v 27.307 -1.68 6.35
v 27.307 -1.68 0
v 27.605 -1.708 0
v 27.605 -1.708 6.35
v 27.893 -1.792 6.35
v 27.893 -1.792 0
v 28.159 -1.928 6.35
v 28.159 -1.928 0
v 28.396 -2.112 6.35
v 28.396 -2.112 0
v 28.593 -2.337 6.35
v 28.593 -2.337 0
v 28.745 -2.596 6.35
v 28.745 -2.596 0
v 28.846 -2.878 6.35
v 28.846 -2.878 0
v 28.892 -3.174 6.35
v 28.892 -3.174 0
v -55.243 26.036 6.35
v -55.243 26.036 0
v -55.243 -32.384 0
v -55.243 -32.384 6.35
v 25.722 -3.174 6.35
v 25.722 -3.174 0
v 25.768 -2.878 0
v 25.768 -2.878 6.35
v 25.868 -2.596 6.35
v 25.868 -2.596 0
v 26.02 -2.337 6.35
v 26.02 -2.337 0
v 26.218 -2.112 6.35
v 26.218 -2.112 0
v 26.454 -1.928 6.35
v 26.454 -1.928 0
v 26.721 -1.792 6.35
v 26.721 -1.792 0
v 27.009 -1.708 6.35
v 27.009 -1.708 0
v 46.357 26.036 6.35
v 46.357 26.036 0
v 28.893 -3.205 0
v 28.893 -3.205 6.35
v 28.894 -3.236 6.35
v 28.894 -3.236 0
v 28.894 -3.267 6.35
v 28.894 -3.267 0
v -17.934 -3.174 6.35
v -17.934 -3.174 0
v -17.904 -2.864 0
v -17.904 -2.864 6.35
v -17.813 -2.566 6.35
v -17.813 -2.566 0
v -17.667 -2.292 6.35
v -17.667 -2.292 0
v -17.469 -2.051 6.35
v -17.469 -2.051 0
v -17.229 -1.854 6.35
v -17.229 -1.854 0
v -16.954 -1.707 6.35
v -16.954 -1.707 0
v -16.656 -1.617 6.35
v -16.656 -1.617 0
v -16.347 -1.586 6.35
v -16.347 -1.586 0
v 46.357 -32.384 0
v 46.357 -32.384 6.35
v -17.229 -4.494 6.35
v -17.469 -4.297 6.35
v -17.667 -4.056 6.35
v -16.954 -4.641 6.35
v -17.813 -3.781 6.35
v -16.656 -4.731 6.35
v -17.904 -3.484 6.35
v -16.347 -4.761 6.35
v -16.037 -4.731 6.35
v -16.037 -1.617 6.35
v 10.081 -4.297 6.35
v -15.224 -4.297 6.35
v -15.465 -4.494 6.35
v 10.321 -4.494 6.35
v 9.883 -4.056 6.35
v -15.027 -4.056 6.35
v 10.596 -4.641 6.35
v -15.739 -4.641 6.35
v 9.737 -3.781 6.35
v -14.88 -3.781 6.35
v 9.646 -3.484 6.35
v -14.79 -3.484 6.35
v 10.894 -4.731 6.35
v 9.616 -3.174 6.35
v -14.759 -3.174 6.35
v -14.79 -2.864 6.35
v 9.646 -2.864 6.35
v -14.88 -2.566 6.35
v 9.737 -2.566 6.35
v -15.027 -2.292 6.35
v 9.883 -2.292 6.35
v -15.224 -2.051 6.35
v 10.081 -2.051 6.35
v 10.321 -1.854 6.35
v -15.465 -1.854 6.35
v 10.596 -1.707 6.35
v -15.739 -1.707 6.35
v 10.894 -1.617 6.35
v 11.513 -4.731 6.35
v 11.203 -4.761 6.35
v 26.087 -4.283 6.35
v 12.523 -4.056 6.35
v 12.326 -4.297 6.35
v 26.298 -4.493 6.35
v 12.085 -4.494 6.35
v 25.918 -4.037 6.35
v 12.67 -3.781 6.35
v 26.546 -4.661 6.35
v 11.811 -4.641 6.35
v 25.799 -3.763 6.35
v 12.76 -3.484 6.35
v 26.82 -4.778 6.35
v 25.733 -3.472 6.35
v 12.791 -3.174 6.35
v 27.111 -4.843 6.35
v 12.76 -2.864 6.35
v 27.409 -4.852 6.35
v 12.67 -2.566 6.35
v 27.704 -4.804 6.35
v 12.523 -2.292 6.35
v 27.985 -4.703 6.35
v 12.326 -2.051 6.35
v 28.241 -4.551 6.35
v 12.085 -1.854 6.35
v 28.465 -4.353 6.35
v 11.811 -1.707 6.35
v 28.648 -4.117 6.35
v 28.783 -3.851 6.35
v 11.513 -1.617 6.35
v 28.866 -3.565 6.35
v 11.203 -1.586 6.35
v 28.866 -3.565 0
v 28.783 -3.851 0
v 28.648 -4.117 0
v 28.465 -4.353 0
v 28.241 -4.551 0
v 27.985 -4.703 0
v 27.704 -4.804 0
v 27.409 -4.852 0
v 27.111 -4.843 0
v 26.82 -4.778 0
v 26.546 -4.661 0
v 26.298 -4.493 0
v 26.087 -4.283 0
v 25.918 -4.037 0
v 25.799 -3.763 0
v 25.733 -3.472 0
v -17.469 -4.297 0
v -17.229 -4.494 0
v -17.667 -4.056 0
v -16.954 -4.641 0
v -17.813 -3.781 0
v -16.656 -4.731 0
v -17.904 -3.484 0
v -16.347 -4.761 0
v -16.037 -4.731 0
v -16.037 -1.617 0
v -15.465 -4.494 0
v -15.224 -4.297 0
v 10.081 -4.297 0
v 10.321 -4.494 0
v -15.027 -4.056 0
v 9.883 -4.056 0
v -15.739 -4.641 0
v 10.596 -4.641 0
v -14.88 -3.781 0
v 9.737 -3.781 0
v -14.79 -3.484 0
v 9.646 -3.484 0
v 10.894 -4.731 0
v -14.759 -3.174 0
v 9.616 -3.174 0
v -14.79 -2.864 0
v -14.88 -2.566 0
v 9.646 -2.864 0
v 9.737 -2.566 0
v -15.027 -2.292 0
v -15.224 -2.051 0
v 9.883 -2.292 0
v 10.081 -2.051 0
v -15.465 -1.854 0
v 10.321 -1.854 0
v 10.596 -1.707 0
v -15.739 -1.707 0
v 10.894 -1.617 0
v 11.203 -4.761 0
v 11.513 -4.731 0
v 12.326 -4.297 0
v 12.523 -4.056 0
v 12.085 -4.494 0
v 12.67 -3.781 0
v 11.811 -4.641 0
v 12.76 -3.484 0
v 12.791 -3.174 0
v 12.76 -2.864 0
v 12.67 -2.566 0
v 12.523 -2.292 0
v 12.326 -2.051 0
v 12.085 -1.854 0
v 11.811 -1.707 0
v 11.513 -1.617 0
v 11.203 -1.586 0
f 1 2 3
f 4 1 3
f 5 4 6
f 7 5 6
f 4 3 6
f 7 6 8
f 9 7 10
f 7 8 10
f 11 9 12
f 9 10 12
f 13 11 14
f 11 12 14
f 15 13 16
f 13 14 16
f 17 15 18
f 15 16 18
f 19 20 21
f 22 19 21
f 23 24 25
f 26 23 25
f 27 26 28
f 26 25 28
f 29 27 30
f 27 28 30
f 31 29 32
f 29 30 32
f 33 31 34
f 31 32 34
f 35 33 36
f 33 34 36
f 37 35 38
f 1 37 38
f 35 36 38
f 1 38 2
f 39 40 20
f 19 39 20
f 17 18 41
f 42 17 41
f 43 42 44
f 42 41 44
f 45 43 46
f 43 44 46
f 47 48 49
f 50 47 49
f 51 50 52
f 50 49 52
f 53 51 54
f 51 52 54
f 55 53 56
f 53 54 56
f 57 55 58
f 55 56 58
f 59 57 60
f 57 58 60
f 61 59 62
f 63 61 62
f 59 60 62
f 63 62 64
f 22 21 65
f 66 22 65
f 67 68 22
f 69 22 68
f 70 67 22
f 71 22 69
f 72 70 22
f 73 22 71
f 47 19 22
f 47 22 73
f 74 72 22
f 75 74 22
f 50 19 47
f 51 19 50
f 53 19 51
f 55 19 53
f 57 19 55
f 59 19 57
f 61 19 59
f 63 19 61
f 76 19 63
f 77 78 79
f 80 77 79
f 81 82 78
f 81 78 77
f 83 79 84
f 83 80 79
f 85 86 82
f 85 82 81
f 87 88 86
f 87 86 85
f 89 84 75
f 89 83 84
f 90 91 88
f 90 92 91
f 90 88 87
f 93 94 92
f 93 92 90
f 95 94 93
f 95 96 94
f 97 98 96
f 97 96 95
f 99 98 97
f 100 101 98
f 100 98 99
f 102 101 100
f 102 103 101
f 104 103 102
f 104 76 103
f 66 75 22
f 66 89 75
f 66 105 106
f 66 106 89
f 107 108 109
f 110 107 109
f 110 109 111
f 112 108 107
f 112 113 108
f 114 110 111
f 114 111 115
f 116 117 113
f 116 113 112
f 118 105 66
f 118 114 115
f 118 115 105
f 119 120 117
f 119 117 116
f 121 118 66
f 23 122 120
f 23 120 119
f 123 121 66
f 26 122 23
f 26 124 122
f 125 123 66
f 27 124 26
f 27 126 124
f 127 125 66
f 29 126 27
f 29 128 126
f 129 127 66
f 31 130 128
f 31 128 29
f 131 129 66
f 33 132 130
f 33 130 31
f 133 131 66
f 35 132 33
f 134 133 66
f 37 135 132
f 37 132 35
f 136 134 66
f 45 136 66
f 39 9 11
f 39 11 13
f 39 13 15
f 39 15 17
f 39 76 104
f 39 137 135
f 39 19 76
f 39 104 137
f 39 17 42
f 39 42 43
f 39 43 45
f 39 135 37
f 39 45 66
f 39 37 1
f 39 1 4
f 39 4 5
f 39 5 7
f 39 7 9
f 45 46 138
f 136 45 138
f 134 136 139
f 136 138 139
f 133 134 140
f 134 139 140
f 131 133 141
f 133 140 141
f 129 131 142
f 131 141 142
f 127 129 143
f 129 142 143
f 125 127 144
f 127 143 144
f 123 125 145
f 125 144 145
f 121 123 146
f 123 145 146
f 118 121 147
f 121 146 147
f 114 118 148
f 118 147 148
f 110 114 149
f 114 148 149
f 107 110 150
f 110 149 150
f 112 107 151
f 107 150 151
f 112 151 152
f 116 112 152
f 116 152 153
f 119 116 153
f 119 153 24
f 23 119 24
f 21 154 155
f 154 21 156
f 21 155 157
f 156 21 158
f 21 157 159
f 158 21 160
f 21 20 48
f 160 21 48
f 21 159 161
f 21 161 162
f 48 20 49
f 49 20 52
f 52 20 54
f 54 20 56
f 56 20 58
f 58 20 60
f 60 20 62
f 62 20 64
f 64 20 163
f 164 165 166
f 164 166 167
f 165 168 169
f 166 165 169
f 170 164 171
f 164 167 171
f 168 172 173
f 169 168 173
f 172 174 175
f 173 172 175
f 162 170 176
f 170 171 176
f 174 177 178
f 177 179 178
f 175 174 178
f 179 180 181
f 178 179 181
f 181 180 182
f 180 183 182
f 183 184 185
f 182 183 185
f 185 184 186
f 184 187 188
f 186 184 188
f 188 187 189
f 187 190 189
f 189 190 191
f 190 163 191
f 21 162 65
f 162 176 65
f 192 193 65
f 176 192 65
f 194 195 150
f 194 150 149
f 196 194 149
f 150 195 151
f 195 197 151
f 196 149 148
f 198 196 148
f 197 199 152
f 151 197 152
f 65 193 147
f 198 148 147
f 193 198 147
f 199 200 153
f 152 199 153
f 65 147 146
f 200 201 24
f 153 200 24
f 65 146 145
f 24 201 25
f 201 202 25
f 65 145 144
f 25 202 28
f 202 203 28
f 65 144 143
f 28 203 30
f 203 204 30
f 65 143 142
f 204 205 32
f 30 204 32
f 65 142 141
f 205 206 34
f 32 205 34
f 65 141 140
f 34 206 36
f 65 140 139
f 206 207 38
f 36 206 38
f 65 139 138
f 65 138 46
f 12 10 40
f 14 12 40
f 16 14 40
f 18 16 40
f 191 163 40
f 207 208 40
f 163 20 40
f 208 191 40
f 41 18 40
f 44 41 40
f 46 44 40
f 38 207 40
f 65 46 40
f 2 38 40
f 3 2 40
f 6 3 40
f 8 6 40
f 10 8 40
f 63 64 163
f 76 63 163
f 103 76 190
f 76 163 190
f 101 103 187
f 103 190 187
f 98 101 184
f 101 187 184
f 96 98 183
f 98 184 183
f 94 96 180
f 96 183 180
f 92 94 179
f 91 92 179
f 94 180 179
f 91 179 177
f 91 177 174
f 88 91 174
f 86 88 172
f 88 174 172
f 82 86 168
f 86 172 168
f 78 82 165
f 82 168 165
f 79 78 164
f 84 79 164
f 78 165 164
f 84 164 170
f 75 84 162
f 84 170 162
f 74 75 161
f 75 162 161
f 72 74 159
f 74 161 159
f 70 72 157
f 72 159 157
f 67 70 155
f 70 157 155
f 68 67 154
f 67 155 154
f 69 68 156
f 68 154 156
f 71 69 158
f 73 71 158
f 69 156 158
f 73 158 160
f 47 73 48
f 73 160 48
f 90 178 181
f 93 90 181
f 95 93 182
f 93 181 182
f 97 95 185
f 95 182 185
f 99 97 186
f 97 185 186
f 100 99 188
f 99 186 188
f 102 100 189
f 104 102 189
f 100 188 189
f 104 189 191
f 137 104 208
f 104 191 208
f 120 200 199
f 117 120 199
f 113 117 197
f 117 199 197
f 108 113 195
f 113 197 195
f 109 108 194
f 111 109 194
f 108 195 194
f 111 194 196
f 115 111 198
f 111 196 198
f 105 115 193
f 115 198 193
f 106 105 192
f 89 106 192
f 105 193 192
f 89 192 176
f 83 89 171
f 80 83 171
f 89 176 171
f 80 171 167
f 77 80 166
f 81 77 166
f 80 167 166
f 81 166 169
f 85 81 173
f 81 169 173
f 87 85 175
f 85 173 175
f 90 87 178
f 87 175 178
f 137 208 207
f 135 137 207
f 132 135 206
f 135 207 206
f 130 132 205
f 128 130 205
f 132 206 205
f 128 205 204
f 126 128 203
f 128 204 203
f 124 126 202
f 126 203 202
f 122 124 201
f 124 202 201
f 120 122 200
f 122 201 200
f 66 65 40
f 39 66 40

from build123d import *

# Parameters (mm, degrees)
F1_DEPTH = 6.35


with BuildPart() as f1:
    # F0 (on Top) → F1 (new body)
    with BuildSketch(Plane.XY):
        with BuildLine():
            ThreePointArc((11.2032132386, 5.3260231485), (17.2136208787, 2.8364307886), (19.7032132386, -3.1739768515))
            Line((19.7032132386, -3.1739768515), (20.1573244902, -3.1739768515))
            ThreePointArc((20.1573244902, -3.1739768515), (22.2840920141, 1.8213627827), (27.3068132386, 3.8826317272))
            Line((27.3068132386, 3.8826317272), (27.3068132386, 26.0360231485))
            Line((27.3068132386, 26.0360231485), (11.2032132386, 26.0360231485))
            Line((11.2032132386, 26.0360231485), (11.2032132386, 5.3260231485))
        make_face()
        with BuildLine():
            ThreePointArc((27.3068132386, 3.8826317272), (22.2840920141, 1.8213627827), (20.1573244902, -3.1739768515))
            Line((20.1573244902, -3.1739768515), (25.7220685891, -3.1739768515))
            ThreePointArc((25.7220685891, -3.1739768515), (26.217836972, -2.1123548841), (27.3068132386, -1.6799682728))
            Line((27.3068132386, -1.6799682728), (27.3068132386, 3.8826317272))
        make_face()
        with BuildLine():
            ThreePointArc((-35.3967867614, -3.1739768515), (-16.3467867614, -22.2239768515), (2.7032132386, -3.1739768515))
            Line((2.7032132386, -3.1739768515), (-14.7592867614, -3.1739768515))
            ThreePointArc((-14.7592867614, -3.1739768515), (-16.3467867614, -4.7614768515), (-17.9342867614, -3.1739768515))
            Line((-17.9342867614, -3.1739768515), (-35.3967867614, -3.1739768515))
        make_face()
        with BuildLine():
            ThreePointArc((19.7032132386, -3.1739768515), (11.2032132386, -11.6739768515), (2.7032132386, -3.1739768515))
            ThreePointArc((2.7032132386, -3.1739768515), (-16.3467867614, -22.2239768515), (-35.3967867614, -3.1739768515))
            Line((-35.3967867614, -3.1739768515), (-55.2431867614, -3.1739768515))
            Line((-55.2431867614, -3.1739768515), (-55.2431867614, -32.3839768515))
            Line((-55.2431867614, -32.3839768515), (46.3568132386, -32.3839768515))
            Line((46.3568132386, -32.3839768515), (46.3568132386, -3.1739768515))
            Line((46.3568132386, -3.1739768515), (34.4563019871, -3.1739768515))
            ThreePointArc((34.4563019871, -3.1739768515), (34.4567604241, -3.220721563), (34.4569132386, -3.2674682728))
            ThreePointArc((34.4569132386, -3.2674682728), (27.2600665289, -10.4174154582), (20.1573244902, -3.1739768515))
            Line((20.1573244902, -3.1739768515), (19.7032132386, -3.1739768515))
        make_face()
        with BuildLine():
            Line((25.7220685891, -3.1739768515), (20.1573244902, -3.1739768515))
            ThreePointArc((20.1573244902, -3.1739768515), (27.2600665289, -10.4174154582), (34.4569132386, -3.2674682728))
            ThreePointArc((34.4569132386, -3.2674682728), (34.4567604241, -3.220721563), (34.4563019871, -3.1739768515))
            Line((34.4563019871, -3.1739768515), (28.8915578882, -3.1739768515))
            ThreePointArc((28.8915578882, -3.1739768515), (28.8936242515, -3.2207022653), (28.8943132386, -3.2674682728))
            ThreePointArc((28.8943132386, -3.2674682728), (27.2600472312, -4.8542792856), (25.7220685891, -3.1739768515))
        make_face()
        with BuildLine():
            Line((12.7907132386, -3.1739768515), (19.7032132386, -3.1739768515))
            ThreePointArc((19.7032132386, -3.1739768515), (17.2136208787, 2.8364307886), (11.2032132386, 5.3260231485))
            Line((11.2032132386, 5.3260231485), (11.2032132386, -1.5864768515))
            ThreePointArc((11.2032132386, -1.5864768515), (12.3257452538, -2.0514448364), (12.7907132386, -3.1739768515))
        make_face()
        with BuildLine():
            ThreePointArc((34.4563019871, -3.1739768515), (32.3295344632, 1.8213627827), (27.3068132386, 3.8826317272))
            Line((27.3068132386, 3.8826317272), (27.3068132386, -1.6799682728))
            ThreePointArc((27.3068132386, -1.6799682728), (28.3957895053, -2.1123548841), (28.8915578882, -3.1739768515))
            Line((28.8915578882, -3.1739768515), (34.4563019871, -3.1739768515))
        make_face()
        with BuildLine():
            Line((-16.3467867614, -1.5864768515), (-16.3467867614, 15.8760231485))
            ThreePointArc((-16.3467867614, 15.8760231485), (-29.817170943, 10.2964073301), (-35.3967867614, -3.1739768515))
            Line((-35.3967867614, -3.1739768515), (-17.9342867614, -3.1739768515))
            ThreePointArc((-17.9342867614, -3.1739768515), (-17.4693187765, -2.0514448364), (-16.3467867614, -1.5864768515))
        make_face()
        with BuildLine():
            ThreePointArc((11.2032132386, 5.3260231485), (5.1928055986, 2.8364307886), (2.7032132386, -3.1739768515))
            Line((2.7032132386, -3.1739768515), (9.6157132386, -3.1739768515))
            ThreePointArc((9.6157132386, -3.1739768515), (10.0806812235, -2.0514448364), (11.2032132386, -1.5864768515))
            Line((11.2032132386, -1.5864768515), (11.2032132386, 5.3260231485))
        make_face()
        with BuildLine():
            Line((9.6157132386, -3.1739768515), (2.7032132386, -3.1739768515))
            ThreePointArc((2.7032132386, -3.1739768515), (11.2032132386, -11.6739768515), (19.7032132386, -3.1739768515))
            Line((19.7032132386, -3.1739768515), (12.7907132386, -3.1739768515))
            ThreePointArc((12.7907132386, -3.1739768515), (11.2032132386, -4.7614768515), (9.6157132386, -3.1739768515))
        make_face()
        with BuildLine():
            ThreePointArc((-35.3967867614, -3.1739768515), (-29.817170943, 10.2964073301), (-16.3467867614, 15.8760231485))
            Line((-16.3467867614, 15.8760231485), (-16.3467867614, 26.0360231485))
            Line((-16.3467867614, 26.0360231485), (-55.2431867614, 26.0360231485))
            Line((-55.2431867614, 26.0360231485), (-55.2431867614, -3.1739768515))
            Line((-55.2431867614, -3.1739768515), (-35.3967867614, -3.1739768515))
        make_face()
        with BuildLine():
            Line((27.3068132386, 26.0360231485), (27.3068132386, 3.8826317272))
            ThreePointArc((27.3068132386, 3.8826317272), (32.3295344632, 1.8213627827), (34.4563019871, -3.1739768515))
            Line((34.4563019871, -3.1739768515), (46.3568132386, -3.1739768515))
            Line((46.3568132386, -3.1739768515), (46.3568132386, 26.0360231485))
            Line((46.3568132386, 26.0360231485), (27.3068132386, 26.0360231485))
        make_face()
        with BuildLine():
            ThreePointArc((-16.3467867614, 15.8760231485), (-2.8764025798, 10.2964073301), (2.7032132386, -3.1739768515))
            ThreePointArc((2.7032132386, -3.1739768515), (5.1928055986, 2.8364307886), (11.2032132386, 5.3260231485))
            Line((11.2032132386, 5.3260231485), (11.2032132386, 26.0360231485))
            Line((11.2032132386, 26.0360231485), (-16.3467867614, 26.0360231485))
            Line((-16.3467867614, 26.0360231485), (-16.3467867614, 15.8760231485))
        make_face()
        with BuildLine():
            Line((-14.7592867614, -3.1739768515), (2.7032132386, -3.1739768515))
            ThreePointArc((2.7032132386, -3.1739768515), (-2.8764025798, 10.2964073301), (-16.3467867614, 15.8760231485))
            Line((-16.3467867614, 15.8760231485), (-16.3467867614, -1.5864768515))
            ThreePointArc((-16.3467867614, -1.5864768515), (-15.2242547462, -2.0514448364), (-14.7592867614, -3.1739768515))
        make_face()
    extrude(amount=F1_DEPTH)


solid = f1.part
